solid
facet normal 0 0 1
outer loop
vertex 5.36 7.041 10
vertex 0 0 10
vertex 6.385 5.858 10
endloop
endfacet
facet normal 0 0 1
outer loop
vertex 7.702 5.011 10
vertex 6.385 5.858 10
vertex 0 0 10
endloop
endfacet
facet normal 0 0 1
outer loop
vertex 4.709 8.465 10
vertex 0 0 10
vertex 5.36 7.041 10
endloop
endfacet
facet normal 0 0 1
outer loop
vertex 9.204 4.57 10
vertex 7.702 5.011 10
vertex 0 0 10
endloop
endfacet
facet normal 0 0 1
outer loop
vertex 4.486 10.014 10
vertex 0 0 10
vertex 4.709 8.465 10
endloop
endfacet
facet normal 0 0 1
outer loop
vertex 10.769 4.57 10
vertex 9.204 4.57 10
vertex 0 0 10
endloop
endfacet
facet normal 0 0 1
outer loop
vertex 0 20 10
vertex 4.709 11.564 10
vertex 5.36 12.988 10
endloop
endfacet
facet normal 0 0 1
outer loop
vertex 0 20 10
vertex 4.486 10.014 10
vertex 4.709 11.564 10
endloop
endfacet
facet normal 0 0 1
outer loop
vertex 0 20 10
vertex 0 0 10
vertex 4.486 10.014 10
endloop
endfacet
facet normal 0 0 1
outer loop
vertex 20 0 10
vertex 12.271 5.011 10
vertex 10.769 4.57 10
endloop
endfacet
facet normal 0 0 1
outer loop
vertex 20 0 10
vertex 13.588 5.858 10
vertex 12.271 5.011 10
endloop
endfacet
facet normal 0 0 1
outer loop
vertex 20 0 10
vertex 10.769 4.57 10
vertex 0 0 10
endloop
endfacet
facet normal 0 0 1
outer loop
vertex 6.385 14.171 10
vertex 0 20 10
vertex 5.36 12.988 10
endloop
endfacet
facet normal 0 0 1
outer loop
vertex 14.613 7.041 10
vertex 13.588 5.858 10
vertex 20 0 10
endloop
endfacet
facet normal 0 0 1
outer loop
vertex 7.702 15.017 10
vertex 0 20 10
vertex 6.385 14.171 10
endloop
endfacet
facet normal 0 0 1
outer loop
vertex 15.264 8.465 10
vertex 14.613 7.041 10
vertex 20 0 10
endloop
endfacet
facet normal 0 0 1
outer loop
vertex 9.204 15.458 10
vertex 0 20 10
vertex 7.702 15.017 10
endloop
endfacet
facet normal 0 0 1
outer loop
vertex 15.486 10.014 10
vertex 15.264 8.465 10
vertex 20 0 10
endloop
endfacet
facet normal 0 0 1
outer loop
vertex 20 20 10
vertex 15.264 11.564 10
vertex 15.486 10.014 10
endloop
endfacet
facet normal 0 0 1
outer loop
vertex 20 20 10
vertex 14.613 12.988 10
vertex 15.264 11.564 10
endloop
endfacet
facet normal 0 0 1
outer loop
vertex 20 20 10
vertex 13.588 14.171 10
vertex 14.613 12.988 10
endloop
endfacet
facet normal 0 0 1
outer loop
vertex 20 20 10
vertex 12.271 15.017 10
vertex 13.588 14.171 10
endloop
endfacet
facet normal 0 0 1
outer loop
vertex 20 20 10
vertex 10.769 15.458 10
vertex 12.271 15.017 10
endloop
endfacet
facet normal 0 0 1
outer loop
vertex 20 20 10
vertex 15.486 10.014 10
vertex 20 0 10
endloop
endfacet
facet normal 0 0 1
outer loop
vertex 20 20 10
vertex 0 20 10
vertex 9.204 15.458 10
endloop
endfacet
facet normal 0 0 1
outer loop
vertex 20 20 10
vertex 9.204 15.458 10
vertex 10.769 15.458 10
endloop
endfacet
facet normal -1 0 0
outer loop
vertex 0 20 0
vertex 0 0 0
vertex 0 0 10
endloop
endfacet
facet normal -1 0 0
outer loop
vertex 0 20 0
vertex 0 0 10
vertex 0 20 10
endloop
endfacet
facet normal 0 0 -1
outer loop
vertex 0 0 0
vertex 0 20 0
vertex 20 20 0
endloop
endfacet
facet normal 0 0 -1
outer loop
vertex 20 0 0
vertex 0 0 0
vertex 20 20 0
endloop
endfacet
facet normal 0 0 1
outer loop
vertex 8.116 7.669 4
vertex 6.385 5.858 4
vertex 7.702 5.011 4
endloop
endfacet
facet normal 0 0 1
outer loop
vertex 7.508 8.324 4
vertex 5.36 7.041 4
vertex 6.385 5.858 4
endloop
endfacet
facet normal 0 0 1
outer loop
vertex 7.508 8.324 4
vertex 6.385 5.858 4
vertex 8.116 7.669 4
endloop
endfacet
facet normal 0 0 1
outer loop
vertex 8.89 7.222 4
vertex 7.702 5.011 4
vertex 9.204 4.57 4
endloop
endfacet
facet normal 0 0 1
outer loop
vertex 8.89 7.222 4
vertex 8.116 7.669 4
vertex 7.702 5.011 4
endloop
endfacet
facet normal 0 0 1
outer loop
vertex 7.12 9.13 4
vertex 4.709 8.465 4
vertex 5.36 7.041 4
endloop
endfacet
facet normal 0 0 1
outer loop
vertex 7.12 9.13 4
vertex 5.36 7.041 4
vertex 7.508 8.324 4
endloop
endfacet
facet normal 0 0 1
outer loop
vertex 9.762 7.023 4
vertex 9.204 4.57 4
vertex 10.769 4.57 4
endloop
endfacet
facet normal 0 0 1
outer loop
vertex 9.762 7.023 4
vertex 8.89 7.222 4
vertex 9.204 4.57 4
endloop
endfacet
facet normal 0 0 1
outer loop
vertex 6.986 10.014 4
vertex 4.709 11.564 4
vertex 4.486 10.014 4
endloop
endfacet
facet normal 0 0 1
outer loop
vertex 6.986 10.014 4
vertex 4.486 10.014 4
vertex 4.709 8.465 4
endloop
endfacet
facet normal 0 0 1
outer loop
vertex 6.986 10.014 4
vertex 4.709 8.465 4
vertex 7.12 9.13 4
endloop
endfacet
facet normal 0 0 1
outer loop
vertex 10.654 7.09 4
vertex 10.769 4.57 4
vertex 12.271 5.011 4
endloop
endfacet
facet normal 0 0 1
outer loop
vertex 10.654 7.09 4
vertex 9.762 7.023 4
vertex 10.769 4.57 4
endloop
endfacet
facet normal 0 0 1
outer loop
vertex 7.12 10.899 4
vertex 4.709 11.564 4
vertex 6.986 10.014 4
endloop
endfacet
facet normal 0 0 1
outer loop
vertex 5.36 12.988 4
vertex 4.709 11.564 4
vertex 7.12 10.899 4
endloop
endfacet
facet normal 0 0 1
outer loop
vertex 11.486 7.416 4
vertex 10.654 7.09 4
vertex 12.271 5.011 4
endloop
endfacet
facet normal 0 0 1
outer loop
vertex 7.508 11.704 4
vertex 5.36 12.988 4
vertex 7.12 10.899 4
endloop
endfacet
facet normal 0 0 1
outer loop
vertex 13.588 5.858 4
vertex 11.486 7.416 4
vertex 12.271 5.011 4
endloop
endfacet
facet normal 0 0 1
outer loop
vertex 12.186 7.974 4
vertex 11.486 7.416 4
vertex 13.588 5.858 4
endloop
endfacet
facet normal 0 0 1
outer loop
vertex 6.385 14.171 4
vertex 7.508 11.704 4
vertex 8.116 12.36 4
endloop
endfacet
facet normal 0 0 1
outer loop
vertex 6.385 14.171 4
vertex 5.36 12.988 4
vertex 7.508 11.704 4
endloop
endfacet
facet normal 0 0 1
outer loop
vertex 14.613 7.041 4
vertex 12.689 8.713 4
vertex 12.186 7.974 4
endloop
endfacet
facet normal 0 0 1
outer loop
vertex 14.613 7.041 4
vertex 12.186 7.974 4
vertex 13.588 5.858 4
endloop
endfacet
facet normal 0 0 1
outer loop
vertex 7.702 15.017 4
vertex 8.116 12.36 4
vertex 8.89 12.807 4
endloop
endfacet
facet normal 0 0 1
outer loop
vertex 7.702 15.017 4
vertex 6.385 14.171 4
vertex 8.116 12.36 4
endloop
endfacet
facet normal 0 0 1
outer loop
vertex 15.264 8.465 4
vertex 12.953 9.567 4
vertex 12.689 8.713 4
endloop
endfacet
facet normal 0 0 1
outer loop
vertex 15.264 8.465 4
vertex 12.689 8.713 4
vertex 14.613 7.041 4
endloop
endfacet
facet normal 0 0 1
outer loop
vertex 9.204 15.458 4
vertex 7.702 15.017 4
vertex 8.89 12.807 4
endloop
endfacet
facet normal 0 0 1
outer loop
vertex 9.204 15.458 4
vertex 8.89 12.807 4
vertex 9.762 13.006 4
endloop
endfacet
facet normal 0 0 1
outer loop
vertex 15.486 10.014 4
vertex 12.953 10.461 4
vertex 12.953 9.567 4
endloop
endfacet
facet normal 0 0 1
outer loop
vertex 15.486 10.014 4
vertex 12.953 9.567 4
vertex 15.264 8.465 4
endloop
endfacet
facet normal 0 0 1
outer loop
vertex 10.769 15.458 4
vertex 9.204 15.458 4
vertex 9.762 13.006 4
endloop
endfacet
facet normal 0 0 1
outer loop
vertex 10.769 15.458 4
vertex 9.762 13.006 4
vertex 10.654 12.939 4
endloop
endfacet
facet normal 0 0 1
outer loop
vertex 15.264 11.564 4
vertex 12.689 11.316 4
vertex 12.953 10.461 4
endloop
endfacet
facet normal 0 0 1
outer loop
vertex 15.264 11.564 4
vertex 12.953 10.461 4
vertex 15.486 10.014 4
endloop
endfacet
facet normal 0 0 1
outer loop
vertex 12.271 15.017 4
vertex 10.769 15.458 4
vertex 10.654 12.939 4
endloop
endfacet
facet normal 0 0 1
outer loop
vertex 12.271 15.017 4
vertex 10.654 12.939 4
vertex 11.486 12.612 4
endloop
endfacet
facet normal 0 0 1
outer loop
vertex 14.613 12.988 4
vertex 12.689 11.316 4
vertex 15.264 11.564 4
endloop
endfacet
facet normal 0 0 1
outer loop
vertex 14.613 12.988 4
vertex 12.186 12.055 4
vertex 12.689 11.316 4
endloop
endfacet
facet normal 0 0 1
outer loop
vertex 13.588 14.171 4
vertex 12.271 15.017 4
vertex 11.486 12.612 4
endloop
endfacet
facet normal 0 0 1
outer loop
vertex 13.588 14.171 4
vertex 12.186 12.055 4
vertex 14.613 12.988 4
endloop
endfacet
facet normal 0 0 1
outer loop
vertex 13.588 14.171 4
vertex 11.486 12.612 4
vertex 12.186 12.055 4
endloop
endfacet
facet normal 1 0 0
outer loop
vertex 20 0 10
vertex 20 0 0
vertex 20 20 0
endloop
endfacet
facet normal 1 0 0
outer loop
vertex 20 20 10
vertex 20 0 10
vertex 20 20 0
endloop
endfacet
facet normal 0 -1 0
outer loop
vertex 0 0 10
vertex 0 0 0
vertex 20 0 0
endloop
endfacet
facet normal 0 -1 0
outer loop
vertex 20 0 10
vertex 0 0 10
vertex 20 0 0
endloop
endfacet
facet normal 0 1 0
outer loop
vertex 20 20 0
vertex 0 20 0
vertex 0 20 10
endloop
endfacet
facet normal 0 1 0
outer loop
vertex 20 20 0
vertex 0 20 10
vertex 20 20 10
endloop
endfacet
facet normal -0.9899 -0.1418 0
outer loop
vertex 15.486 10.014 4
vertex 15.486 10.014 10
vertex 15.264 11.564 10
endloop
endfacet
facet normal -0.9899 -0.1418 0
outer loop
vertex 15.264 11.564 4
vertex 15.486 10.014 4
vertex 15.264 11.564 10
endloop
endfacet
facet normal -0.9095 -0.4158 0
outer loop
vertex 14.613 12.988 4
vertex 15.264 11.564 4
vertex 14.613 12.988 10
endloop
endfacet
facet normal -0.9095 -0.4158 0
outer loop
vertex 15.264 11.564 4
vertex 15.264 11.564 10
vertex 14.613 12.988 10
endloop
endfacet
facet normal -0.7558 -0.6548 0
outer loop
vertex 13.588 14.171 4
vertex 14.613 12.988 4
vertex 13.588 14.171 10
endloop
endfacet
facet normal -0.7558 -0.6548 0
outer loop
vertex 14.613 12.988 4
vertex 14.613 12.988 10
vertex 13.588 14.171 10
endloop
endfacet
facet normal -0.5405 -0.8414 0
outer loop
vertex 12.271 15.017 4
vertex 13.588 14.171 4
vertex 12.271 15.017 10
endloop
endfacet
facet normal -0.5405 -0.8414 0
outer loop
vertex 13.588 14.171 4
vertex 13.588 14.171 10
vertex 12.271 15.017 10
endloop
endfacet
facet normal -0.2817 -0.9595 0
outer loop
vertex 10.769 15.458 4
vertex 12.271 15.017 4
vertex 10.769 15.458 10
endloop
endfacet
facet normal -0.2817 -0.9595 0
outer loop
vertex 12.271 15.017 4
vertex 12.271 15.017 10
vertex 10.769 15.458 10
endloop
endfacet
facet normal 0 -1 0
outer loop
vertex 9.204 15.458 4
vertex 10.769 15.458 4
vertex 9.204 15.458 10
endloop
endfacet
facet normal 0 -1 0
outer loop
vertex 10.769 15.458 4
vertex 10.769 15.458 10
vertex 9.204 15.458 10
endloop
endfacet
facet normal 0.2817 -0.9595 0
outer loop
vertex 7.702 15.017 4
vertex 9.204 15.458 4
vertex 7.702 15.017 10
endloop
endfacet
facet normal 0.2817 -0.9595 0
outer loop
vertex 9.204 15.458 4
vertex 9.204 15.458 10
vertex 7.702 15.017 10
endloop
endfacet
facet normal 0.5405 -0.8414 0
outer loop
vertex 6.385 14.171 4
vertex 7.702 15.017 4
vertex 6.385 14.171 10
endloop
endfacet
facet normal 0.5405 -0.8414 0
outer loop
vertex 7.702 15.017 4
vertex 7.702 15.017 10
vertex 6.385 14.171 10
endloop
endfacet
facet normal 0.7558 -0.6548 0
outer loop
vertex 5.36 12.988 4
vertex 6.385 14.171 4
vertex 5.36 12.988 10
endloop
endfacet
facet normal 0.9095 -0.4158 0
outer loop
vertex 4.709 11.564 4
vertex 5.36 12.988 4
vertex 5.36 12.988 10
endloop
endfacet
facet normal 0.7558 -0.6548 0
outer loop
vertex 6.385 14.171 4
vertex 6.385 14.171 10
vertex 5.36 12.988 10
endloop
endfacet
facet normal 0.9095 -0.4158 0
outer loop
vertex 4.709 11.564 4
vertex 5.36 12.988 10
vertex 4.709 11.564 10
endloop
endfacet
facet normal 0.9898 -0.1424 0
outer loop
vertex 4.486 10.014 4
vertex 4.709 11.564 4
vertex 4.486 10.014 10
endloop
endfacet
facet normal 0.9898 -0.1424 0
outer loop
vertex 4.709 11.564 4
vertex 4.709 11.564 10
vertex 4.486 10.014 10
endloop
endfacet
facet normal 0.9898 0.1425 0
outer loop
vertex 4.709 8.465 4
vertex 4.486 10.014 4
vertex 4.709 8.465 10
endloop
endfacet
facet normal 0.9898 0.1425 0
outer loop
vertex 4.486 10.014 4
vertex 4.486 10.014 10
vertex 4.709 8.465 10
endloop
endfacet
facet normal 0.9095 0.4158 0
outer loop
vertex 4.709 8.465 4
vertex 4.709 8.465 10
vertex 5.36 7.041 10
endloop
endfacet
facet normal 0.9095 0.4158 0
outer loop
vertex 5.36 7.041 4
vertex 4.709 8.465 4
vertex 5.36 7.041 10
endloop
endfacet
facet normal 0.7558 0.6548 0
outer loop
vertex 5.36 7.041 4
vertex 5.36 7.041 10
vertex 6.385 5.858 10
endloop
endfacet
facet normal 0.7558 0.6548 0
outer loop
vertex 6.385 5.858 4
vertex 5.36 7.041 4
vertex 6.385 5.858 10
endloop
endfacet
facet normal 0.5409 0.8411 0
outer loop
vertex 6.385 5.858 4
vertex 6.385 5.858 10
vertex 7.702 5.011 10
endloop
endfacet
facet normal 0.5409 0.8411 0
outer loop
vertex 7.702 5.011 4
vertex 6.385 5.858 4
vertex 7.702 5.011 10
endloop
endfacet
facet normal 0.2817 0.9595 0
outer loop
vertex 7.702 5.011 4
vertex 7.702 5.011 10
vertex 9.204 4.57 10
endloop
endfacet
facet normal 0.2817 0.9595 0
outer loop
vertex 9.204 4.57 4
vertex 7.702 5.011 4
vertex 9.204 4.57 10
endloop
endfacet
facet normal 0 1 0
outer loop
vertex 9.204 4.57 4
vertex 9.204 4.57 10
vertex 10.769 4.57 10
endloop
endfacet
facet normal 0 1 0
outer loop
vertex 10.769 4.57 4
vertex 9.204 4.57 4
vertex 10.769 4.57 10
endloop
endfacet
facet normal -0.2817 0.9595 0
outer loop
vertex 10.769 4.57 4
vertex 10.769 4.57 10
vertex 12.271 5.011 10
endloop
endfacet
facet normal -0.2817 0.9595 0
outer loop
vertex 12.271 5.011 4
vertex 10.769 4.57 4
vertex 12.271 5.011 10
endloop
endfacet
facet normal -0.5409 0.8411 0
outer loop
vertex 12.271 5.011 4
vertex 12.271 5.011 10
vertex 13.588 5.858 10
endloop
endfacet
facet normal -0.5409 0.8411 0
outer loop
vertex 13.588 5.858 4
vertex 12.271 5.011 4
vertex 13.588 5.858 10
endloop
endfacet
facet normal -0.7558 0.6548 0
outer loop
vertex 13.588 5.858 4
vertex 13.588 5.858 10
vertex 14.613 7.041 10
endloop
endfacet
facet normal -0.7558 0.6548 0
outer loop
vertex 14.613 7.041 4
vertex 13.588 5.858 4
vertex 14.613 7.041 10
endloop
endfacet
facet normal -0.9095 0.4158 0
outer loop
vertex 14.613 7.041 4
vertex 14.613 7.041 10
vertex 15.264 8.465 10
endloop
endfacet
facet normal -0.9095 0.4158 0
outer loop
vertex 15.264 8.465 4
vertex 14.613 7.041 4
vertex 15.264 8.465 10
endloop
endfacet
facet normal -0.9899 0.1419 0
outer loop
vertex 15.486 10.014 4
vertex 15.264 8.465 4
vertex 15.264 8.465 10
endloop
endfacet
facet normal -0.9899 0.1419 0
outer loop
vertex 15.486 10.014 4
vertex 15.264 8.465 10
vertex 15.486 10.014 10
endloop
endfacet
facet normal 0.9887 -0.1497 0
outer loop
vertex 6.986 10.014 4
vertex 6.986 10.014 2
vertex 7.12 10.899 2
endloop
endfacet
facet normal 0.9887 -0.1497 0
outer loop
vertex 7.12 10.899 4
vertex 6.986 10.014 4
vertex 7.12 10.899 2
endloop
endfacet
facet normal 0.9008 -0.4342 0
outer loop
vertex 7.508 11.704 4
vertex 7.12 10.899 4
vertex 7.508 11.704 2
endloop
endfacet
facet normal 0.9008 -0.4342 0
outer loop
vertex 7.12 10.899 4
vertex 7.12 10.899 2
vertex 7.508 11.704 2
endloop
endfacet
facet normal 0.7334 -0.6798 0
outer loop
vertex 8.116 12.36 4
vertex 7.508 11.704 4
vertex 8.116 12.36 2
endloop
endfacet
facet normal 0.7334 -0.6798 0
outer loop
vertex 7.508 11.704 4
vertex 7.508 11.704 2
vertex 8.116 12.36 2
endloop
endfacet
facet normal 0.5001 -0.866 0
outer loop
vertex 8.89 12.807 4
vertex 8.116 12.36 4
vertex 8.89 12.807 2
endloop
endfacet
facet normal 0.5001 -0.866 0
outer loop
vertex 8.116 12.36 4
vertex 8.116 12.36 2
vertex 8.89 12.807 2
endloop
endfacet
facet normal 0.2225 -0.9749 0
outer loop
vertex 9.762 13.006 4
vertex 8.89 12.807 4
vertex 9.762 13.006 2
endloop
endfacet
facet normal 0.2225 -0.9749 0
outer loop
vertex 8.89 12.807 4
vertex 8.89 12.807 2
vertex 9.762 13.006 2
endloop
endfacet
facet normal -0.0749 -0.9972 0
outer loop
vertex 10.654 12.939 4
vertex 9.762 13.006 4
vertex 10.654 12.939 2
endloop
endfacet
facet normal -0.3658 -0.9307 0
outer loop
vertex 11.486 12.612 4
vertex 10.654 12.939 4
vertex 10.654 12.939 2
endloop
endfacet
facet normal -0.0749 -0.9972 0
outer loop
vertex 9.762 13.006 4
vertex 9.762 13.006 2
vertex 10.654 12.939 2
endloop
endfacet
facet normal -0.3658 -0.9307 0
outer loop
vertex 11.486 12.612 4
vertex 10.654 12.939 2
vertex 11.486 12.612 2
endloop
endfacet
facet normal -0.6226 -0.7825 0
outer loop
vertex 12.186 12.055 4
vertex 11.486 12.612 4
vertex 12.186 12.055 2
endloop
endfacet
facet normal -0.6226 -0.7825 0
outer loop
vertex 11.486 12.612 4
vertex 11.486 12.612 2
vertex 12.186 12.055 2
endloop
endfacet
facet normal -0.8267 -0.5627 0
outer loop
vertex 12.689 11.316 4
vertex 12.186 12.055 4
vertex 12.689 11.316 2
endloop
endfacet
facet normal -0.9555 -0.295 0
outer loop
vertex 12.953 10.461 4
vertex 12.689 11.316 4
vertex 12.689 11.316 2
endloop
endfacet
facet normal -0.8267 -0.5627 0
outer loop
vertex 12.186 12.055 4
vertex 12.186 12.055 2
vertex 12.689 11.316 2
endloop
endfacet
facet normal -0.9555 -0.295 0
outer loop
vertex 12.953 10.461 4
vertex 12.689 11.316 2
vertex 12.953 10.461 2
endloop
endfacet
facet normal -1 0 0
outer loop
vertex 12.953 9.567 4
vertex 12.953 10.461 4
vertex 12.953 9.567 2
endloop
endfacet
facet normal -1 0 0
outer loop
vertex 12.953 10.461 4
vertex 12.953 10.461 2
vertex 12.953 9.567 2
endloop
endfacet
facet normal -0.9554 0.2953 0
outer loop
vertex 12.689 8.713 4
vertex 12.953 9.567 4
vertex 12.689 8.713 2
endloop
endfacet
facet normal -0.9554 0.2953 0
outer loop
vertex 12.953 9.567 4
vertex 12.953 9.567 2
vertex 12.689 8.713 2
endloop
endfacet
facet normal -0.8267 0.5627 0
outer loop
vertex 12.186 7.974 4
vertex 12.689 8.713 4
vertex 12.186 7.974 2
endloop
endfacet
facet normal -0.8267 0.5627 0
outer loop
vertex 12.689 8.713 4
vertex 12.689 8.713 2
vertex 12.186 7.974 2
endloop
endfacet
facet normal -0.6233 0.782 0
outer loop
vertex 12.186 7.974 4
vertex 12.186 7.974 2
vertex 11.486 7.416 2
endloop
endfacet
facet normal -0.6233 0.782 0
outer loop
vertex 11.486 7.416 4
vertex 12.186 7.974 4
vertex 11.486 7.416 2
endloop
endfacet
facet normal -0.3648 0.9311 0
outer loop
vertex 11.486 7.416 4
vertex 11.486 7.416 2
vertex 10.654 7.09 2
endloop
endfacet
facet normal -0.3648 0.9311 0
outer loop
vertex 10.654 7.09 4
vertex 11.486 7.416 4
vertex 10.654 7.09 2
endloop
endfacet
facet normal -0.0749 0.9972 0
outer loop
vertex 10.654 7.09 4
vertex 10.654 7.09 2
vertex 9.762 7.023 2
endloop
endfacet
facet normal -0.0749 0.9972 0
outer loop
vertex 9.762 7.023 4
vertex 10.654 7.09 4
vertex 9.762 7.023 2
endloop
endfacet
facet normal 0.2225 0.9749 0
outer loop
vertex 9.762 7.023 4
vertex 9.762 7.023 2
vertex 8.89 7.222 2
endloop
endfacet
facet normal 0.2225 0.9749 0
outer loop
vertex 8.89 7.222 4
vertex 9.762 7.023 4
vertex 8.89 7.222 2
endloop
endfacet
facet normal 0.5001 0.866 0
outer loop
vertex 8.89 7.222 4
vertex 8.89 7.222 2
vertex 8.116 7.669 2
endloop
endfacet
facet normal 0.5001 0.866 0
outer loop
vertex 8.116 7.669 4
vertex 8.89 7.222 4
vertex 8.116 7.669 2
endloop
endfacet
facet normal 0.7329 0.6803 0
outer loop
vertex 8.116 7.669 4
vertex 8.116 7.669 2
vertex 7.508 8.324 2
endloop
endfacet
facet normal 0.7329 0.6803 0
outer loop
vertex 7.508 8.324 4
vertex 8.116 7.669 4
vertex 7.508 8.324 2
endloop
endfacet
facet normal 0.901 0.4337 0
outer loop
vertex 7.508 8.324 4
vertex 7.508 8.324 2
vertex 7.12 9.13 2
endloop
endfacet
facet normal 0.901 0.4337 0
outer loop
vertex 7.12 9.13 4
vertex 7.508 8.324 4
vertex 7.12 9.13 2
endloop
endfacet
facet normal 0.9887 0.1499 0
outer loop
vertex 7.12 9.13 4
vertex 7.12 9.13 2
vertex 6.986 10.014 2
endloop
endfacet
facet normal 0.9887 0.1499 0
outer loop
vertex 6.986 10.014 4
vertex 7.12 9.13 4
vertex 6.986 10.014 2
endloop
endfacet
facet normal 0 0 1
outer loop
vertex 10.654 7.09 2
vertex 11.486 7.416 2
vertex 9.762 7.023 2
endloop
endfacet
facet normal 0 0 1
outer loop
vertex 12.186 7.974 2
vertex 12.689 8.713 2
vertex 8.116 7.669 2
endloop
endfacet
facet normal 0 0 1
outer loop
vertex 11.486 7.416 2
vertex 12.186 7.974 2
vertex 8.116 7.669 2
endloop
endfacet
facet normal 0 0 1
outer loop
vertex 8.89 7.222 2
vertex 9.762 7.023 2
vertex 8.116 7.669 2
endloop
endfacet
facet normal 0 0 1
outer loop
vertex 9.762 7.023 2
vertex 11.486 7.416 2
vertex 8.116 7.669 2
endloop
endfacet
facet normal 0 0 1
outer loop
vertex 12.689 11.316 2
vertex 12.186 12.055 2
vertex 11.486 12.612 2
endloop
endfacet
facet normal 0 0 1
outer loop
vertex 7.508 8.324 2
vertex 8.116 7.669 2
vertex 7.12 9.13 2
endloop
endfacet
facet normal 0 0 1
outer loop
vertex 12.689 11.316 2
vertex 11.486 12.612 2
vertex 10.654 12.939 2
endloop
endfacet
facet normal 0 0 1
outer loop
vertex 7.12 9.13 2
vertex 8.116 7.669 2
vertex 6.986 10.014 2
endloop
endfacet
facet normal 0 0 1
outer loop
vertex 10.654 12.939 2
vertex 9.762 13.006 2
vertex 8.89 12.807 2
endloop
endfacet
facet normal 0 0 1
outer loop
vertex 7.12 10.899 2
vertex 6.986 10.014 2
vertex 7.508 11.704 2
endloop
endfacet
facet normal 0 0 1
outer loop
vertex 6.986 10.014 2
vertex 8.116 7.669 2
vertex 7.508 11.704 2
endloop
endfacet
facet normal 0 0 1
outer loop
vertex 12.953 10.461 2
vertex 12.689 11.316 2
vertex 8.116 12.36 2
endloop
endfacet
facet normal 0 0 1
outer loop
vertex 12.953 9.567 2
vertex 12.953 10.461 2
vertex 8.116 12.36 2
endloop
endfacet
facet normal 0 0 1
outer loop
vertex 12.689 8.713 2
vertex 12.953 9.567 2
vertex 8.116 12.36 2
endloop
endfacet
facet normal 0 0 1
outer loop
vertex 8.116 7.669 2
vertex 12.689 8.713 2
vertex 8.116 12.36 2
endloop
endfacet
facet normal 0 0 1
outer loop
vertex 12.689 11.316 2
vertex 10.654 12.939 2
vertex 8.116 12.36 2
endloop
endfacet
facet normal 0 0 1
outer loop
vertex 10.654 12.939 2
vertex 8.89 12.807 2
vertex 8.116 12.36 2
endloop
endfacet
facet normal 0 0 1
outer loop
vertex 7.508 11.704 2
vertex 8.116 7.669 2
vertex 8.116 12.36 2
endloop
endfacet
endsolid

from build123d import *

# Parameters (mm, degrees)
SKETCH_1_W                              = 20
SKETCH_1_H                              = 20
BASEBOX_DEPTH                           = 10
HOLE_BLINDCBORE_THRU_DEPTH8_D           = 6
HOLE_BLINDCBORE_THRU_DEPTH8_DEPTH       = 8
HOLE_BLINDCBORE_THRU_DEPTH8_CBORE_D     = 11
HOLE_BLINDCBORE_THRU_DEPTH8_CBORE_DEPTH = 6


with BuildPart() as part:
    # 草图1 → BaseBox (new body)
    with BuildSketch(Plane.XY):
        with Locations((10, 10)):
            Rectangle(SKETCH_1_W, SKETCH_1_H)
    extrude(amount=BASEBOX_DEPTH)

    # Hole_BlindCbore_thru_depth8
    with Locations(Plane.XY.offset(10)):
        with Locations((9.986487375, 10.014305599)):
            CounterBoreHole(HOLE_BLINDCBORE_THRU_DEPTH8_D / 2, HOLE_BLINDCBORE_THRU_DEPTH8_CBORE_D / 2, HOLE_BLINDCBORE_THRU_DEPTH8_CBORE_DEPTH, depth=HOLE_BLINDCBORE_THRU_DEPTH8_DEPTH)


solid = part.part
